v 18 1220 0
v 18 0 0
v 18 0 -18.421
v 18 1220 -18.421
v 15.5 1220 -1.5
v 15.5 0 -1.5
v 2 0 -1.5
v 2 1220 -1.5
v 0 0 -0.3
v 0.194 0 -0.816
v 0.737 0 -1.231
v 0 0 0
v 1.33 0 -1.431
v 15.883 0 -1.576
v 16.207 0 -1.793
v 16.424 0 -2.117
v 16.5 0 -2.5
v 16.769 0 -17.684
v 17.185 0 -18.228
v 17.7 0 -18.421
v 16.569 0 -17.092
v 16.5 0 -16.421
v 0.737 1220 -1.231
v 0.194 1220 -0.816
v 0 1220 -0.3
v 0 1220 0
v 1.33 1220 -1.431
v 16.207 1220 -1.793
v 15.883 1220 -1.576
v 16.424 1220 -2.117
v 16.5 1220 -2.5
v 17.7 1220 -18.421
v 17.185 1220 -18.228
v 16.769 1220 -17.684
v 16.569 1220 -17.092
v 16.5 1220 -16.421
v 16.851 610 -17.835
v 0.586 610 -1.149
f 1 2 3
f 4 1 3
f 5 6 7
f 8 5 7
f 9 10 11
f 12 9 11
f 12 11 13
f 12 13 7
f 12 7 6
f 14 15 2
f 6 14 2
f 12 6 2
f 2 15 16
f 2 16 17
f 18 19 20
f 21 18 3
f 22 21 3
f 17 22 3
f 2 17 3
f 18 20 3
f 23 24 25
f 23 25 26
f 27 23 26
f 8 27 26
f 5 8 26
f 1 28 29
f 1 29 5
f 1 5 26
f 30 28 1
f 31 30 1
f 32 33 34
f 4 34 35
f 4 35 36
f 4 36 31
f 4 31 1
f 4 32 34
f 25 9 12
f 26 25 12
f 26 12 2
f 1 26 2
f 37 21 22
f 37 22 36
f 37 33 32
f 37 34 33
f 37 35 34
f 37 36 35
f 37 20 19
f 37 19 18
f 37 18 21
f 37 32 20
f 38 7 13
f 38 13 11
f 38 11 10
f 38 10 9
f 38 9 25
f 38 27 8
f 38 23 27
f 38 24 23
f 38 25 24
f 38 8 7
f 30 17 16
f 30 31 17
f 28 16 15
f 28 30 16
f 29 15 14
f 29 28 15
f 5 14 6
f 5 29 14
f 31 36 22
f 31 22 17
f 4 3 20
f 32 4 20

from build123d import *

# Parameters (mm, degrees)
BOSS_EXTRUDE1_DEPTH = 1220
FILLET1_R           = 1
FILLET2_SIZE        = 2
FILLET2_SIZE_2      = 1.2
FILLET3_SIZE        = 1.2
FILLET3_SIZE_2      = 2


with BuildPart() as part:
    # Sketch1 → Boss-Extrude1 (new body)
    with BuildSketch(Plane(origin=(0, 0, 0), x_dir=(1, 0, 0), z_dir=(0, 1, 0))):
        Polygon((0, 0), (18, 0), (18, 18.421241087), (16.5, 18.421241087), (16.5, 1.5), (0, 1.5), align=None)
    extrude(amount=BOSS_EXTRUDE1_DEPTH)

    # Fillet1
    fillet1_edges = [part.edges().sort_by_distance(p)[0] for p in [
        (16.5, 610, -1.5),
    ]]
    fillet(fillet1_edges, radius=FILLET1_R)

    # Fillet2
    # an asymmetric fillet: 2, 1.2 mm, written as the material it takes off along each edge
    with BuildSketch(Plane(origin=(16.5, -5, -18.421241087), x_dir=(0, 0, 1), z_dir=(0, 1, 0))) as fillet2_piece_1:
        with BuildLine():
            Bezier((FILLET2_SIZE, 0), (0, 0), (0, FILLET2_SIZE_2), weights=[1, 0.707106781, 1])
            Line((0, FILLET2_SIZE_2), (0, 0))
            Line((0, 0), (FILLET2_SIZE, 0))
        make_face()
    extrude(amount=1230, mode=Mode.SUBTRACT)

    # Fillet3
    # an asymmetric fillet: 2, 1.2 mm, written as the material it takes off along each edge
    with BuildSketch(Plane(origin=(0, -5, -1.5), x_dir=(0, 0, 1), z_dir=(0, 1, 0))) as fillet3_piece_1:
        with BuildLine():
            Bezier((FILLET3_SIZE, 0), (0, 0), (0, FILLET3_SIZE_2), weights=[1, 0.707106781, 1])
            Line((0, FILLET3_SIZE_2), (0, 0))
            Line((0, 0), (FILLET3_SIZE, 0))
        make_face()
    extrude(amount=1230, mode=Mode.SUBTRACT)


solid = part.part
